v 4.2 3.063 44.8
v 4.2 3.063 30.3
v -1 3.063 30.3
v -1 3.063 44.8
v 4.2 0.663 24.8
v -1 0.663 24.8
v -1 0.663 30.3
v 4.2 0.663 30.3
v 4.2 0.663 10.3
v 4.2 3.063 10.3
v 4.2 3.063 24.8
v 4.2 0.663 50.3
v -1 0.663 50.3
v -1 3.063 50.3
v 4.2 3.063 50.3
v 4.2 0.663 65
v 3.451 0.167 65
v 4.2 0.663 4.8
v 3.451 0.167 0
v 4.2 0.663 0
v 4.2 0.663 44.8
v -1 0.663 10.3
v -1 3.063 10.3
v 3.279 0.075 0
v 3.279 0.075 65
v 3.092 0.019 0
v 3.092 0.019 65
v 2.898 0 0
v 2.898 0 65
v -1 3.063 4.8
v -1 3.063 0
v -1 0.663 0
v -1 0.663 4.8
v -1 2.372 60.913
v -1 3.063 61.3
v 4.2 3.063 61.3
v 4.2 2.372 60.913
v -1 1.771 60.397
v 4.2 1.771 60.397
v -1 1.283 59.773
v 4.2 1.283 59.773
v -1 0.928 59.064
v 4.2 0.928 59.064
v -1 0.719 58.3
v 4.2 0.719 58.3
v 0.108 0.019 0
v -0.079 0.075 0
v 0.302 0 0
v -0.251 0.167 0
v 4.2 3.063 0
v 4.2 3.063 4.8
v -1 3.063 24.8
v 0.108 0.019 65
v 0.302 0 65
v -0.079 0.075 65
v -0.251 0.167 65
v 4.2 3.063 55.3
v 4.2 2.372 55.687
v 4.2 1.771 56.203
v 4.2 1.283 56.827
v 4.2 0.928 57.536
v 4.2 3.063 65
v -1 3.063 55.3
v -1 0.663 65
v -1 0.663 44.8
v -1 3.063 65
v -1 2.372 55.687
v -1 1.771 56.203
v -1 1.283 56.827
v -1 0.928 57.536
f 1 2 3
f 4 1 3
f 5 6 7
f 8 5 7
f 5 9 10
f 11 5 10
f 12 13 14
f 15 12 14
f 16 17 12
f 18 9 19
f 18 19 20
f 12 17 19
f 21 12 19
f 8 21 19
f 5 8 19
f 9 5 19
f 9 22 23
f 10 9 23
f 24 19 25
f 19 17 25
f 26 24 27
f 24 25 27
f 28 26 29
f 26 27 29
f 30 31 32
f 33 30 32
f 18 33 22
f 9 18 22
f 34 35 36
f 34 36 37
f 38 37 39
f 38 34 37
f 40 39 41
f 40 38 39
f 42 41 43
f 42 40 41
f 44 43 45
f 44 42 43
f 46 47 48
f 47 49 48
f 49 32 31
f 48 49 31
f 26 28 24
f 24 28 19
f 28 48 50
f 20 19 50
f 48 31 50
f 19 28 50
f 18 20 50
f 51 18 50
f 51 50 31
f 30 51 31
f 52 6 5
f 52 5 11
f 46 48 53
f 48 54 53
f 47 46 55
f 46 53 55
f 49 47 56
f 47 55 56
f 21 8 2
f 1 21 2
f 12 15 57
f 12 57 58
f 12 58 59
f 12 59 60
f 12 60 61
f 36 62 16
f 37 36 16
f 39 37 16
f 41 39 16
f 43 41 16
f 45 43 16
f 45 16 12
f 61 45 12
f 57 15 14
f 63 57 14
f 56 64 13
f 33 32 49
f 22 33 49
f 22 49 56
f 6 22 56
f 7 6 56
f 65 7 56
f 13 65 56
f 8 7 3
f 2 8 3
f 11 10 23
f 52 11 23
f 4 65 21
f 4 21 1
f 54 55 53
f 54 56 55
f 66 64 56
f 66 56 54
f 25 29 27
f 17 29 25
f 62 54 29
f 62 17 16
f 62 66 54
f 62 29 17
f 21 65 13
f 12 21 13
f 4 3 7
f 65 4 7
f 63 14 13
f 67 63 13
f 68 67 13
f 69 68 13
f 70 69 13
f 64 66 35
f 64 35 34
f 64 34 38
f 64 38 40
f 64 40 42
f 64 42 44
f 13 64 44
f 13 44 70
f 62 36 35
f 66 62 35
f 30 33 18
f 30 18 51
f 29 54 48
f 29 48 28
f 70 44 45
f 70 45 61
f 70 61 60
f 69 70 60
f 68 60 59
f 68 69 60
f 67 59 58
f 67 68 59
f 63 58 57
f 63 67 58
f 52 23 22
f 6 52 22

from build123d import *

# Parameters (mm, degrees)
BOSS_EXTRUDE1_DEPTH = 65
SKETCH2_W           = 5.5
SKETCH2_H           = 2.4
CUT_EXTRUDE1_DEPTH  = 6
LPATTERN1_COUNT     = 3
LPATTERN1_PITCH     = 20
SKETCH3_W           = 6
SKETCH3_H           = 2.4
CUT_EXTRUDE2_DEPTH  = 6
FILLET1_R           = 4
FILLET2_R           = 4
FILLET3_R           = 1
FILLET4_R           = 1


with BuildPart() as part:
    # Sketch1 → Boss-Extrude1 (new body)
    with BuildSketch(Plane.XY):
        Polygon((0, 0), (3.2, 0), (4.2, 0.663324958), (4.2, 3.063324958), (-1, 3.063324958), (-1, 0.663324958), align=None)
    extrude(amount=BOSS_EXTRUDE1_DEPTH)

    # Sketch2 → Cut-Extrude1 (cut)
    with BuildSketch(Plane.ZY.offset(1)):
        with Locations((7.55, 1.863324958)):
            Rectangle(SKETCH2_W, SKETCH2_H)
    cut_extrude1 = extrude(amount=-CUT_EXTRUDE1_DEPTH, mode=Mode.SUBTRACT)

    # LPattern1: Cut-Extrude1 ×3
    with Locations(*[(0, 0, i * LPATTERN1_PITCH) for i in range(1, LPATTERN1_COUNT)]):
        add(cut_extrude1, mode=Mode.SUBTRACT)

    # Sketch3 → Cut-Extrude2 (cut)
    with BuildSketch(Plane.ZY.offset(1)):
        with Locations((58.3, 1.863324958)):
            Rectangle(SKETCH3_W, SKETCH3_H)
    extrude(amount=-CUT_EXTRUDE2_DEPTH, mode=Mode.SUBTRACT)

    # Fillet1
    # the kernel refuses this fillet: 4 mm, written as the material it adds along each edge
    with BuildSketch(Plane(origin=(-1, 0.663324958, 55.3), x_dir=(0, 0, 1), z_dir=(1, 0, 0))) as fillet1_piece_1_section:
        with BuildLine():
            CenterArc((3.666060556, -4), FILLET1_R, 90, 66.421821522)
            Line((0, -2.4), (-0.073321211, -2.368))
            ThreePointArc((-0.073321211, -2.368), (-0.08, -1.2), (-0.08, 0))
            Line((-0.08, 0), (0, 0.08))
            Line((0, 0.08), (3.666060556, 0.08))
            Line((3.666060556, 0.08), (3.666060556, 0))
        make_face()
    fillet1_piece_1 = extrude(amount=5.2, mode=Mode.PRIVATE)
    fillet1_piece_1 = split(fillet1_piece_1, bisect_by=Plane(origin=(0.518931728, -0.344220367, 56.190586237), z_dir=(0.5527707983925672, 0.833333333333333, 0)), keep=Keep.TOP, mode=Mode.PRIVATE)
    fillet1_piece_1 = split(fillet1_piece_1, bisect_by=Plane(origin=(2.681068272, -0.344220367, 56.190586237), z_dir=(-0.5527707983925666, 0.8333333333333335, 0)), keep=Keep.TOP, mode=Mode.PRIVATE)
    add(fillet1_piece_1)

    # Fillet2
    # the kernel refuses this fillet: 4 mm, written as the material it adds along each edge
    with BuildSketch(Plane(origin=(-1, 0.663324958, 61.3), x_dir=(0, 1, 0), z_dir=(1, 0, 0))) as fillet2_piece_1_section:
        with BuildLine():
            CenterArc((4, -3.666060556), FILLET2_R, 113.578178478, 66.421821522)
            Line((0, -3.666060556), (-0.08, -3.666060556))
            Line((-0.08, -3.666060556), (-0.08, 0))
            Line((-0.08, 0), (0, 0.08))
            ThreePointArc((0, 0.08), (1.2, 0.08), (2.368, 0.073321211))
            Line((2.368, 0.073321211), (2.4, 0))
        make_face()
    fillet2_piece_1 = extrude(amount=5.2, mode=Mode.PRIVATE)
    fillet2_piece_1 = split(fillet2_piece_1, bisect_by=Plane(origin=(2.681068272, -0.344220367, 60.409413763), z_dir=(-0.5527707983925666, 0.8333333333333335, 0)), keep=Keep.TOP, mode=Mode.PRIVATE)
    fillet2_piece_1 = split(fillet2_piece_1, bisect_by=Plane(origin=(0.518931728, -0.344220367, 60.409413763), z_dir=(0.5527707983925672, 0.833333333333333, 0)), keep=Keep.TOP, mode=Mode.PRIVATE)
    add(fillet2_piece_1)

    # Fillet3
    fillet3_edges = [part.edges().sort_by_distance(p)[0] for p in [
        (3.2, 0, 32.5),
    ]]
    fillet(fillet3_edges, radius=FILLET3_R)

    # Fillet4
    fillet4_edges = [part.edges().sort_by_distance(p)[0] for p in [
        (0, 0, 32.5),
    ]]
    fillet(fillet4_edges, radius=FILLET4_R)


solid = part.part
